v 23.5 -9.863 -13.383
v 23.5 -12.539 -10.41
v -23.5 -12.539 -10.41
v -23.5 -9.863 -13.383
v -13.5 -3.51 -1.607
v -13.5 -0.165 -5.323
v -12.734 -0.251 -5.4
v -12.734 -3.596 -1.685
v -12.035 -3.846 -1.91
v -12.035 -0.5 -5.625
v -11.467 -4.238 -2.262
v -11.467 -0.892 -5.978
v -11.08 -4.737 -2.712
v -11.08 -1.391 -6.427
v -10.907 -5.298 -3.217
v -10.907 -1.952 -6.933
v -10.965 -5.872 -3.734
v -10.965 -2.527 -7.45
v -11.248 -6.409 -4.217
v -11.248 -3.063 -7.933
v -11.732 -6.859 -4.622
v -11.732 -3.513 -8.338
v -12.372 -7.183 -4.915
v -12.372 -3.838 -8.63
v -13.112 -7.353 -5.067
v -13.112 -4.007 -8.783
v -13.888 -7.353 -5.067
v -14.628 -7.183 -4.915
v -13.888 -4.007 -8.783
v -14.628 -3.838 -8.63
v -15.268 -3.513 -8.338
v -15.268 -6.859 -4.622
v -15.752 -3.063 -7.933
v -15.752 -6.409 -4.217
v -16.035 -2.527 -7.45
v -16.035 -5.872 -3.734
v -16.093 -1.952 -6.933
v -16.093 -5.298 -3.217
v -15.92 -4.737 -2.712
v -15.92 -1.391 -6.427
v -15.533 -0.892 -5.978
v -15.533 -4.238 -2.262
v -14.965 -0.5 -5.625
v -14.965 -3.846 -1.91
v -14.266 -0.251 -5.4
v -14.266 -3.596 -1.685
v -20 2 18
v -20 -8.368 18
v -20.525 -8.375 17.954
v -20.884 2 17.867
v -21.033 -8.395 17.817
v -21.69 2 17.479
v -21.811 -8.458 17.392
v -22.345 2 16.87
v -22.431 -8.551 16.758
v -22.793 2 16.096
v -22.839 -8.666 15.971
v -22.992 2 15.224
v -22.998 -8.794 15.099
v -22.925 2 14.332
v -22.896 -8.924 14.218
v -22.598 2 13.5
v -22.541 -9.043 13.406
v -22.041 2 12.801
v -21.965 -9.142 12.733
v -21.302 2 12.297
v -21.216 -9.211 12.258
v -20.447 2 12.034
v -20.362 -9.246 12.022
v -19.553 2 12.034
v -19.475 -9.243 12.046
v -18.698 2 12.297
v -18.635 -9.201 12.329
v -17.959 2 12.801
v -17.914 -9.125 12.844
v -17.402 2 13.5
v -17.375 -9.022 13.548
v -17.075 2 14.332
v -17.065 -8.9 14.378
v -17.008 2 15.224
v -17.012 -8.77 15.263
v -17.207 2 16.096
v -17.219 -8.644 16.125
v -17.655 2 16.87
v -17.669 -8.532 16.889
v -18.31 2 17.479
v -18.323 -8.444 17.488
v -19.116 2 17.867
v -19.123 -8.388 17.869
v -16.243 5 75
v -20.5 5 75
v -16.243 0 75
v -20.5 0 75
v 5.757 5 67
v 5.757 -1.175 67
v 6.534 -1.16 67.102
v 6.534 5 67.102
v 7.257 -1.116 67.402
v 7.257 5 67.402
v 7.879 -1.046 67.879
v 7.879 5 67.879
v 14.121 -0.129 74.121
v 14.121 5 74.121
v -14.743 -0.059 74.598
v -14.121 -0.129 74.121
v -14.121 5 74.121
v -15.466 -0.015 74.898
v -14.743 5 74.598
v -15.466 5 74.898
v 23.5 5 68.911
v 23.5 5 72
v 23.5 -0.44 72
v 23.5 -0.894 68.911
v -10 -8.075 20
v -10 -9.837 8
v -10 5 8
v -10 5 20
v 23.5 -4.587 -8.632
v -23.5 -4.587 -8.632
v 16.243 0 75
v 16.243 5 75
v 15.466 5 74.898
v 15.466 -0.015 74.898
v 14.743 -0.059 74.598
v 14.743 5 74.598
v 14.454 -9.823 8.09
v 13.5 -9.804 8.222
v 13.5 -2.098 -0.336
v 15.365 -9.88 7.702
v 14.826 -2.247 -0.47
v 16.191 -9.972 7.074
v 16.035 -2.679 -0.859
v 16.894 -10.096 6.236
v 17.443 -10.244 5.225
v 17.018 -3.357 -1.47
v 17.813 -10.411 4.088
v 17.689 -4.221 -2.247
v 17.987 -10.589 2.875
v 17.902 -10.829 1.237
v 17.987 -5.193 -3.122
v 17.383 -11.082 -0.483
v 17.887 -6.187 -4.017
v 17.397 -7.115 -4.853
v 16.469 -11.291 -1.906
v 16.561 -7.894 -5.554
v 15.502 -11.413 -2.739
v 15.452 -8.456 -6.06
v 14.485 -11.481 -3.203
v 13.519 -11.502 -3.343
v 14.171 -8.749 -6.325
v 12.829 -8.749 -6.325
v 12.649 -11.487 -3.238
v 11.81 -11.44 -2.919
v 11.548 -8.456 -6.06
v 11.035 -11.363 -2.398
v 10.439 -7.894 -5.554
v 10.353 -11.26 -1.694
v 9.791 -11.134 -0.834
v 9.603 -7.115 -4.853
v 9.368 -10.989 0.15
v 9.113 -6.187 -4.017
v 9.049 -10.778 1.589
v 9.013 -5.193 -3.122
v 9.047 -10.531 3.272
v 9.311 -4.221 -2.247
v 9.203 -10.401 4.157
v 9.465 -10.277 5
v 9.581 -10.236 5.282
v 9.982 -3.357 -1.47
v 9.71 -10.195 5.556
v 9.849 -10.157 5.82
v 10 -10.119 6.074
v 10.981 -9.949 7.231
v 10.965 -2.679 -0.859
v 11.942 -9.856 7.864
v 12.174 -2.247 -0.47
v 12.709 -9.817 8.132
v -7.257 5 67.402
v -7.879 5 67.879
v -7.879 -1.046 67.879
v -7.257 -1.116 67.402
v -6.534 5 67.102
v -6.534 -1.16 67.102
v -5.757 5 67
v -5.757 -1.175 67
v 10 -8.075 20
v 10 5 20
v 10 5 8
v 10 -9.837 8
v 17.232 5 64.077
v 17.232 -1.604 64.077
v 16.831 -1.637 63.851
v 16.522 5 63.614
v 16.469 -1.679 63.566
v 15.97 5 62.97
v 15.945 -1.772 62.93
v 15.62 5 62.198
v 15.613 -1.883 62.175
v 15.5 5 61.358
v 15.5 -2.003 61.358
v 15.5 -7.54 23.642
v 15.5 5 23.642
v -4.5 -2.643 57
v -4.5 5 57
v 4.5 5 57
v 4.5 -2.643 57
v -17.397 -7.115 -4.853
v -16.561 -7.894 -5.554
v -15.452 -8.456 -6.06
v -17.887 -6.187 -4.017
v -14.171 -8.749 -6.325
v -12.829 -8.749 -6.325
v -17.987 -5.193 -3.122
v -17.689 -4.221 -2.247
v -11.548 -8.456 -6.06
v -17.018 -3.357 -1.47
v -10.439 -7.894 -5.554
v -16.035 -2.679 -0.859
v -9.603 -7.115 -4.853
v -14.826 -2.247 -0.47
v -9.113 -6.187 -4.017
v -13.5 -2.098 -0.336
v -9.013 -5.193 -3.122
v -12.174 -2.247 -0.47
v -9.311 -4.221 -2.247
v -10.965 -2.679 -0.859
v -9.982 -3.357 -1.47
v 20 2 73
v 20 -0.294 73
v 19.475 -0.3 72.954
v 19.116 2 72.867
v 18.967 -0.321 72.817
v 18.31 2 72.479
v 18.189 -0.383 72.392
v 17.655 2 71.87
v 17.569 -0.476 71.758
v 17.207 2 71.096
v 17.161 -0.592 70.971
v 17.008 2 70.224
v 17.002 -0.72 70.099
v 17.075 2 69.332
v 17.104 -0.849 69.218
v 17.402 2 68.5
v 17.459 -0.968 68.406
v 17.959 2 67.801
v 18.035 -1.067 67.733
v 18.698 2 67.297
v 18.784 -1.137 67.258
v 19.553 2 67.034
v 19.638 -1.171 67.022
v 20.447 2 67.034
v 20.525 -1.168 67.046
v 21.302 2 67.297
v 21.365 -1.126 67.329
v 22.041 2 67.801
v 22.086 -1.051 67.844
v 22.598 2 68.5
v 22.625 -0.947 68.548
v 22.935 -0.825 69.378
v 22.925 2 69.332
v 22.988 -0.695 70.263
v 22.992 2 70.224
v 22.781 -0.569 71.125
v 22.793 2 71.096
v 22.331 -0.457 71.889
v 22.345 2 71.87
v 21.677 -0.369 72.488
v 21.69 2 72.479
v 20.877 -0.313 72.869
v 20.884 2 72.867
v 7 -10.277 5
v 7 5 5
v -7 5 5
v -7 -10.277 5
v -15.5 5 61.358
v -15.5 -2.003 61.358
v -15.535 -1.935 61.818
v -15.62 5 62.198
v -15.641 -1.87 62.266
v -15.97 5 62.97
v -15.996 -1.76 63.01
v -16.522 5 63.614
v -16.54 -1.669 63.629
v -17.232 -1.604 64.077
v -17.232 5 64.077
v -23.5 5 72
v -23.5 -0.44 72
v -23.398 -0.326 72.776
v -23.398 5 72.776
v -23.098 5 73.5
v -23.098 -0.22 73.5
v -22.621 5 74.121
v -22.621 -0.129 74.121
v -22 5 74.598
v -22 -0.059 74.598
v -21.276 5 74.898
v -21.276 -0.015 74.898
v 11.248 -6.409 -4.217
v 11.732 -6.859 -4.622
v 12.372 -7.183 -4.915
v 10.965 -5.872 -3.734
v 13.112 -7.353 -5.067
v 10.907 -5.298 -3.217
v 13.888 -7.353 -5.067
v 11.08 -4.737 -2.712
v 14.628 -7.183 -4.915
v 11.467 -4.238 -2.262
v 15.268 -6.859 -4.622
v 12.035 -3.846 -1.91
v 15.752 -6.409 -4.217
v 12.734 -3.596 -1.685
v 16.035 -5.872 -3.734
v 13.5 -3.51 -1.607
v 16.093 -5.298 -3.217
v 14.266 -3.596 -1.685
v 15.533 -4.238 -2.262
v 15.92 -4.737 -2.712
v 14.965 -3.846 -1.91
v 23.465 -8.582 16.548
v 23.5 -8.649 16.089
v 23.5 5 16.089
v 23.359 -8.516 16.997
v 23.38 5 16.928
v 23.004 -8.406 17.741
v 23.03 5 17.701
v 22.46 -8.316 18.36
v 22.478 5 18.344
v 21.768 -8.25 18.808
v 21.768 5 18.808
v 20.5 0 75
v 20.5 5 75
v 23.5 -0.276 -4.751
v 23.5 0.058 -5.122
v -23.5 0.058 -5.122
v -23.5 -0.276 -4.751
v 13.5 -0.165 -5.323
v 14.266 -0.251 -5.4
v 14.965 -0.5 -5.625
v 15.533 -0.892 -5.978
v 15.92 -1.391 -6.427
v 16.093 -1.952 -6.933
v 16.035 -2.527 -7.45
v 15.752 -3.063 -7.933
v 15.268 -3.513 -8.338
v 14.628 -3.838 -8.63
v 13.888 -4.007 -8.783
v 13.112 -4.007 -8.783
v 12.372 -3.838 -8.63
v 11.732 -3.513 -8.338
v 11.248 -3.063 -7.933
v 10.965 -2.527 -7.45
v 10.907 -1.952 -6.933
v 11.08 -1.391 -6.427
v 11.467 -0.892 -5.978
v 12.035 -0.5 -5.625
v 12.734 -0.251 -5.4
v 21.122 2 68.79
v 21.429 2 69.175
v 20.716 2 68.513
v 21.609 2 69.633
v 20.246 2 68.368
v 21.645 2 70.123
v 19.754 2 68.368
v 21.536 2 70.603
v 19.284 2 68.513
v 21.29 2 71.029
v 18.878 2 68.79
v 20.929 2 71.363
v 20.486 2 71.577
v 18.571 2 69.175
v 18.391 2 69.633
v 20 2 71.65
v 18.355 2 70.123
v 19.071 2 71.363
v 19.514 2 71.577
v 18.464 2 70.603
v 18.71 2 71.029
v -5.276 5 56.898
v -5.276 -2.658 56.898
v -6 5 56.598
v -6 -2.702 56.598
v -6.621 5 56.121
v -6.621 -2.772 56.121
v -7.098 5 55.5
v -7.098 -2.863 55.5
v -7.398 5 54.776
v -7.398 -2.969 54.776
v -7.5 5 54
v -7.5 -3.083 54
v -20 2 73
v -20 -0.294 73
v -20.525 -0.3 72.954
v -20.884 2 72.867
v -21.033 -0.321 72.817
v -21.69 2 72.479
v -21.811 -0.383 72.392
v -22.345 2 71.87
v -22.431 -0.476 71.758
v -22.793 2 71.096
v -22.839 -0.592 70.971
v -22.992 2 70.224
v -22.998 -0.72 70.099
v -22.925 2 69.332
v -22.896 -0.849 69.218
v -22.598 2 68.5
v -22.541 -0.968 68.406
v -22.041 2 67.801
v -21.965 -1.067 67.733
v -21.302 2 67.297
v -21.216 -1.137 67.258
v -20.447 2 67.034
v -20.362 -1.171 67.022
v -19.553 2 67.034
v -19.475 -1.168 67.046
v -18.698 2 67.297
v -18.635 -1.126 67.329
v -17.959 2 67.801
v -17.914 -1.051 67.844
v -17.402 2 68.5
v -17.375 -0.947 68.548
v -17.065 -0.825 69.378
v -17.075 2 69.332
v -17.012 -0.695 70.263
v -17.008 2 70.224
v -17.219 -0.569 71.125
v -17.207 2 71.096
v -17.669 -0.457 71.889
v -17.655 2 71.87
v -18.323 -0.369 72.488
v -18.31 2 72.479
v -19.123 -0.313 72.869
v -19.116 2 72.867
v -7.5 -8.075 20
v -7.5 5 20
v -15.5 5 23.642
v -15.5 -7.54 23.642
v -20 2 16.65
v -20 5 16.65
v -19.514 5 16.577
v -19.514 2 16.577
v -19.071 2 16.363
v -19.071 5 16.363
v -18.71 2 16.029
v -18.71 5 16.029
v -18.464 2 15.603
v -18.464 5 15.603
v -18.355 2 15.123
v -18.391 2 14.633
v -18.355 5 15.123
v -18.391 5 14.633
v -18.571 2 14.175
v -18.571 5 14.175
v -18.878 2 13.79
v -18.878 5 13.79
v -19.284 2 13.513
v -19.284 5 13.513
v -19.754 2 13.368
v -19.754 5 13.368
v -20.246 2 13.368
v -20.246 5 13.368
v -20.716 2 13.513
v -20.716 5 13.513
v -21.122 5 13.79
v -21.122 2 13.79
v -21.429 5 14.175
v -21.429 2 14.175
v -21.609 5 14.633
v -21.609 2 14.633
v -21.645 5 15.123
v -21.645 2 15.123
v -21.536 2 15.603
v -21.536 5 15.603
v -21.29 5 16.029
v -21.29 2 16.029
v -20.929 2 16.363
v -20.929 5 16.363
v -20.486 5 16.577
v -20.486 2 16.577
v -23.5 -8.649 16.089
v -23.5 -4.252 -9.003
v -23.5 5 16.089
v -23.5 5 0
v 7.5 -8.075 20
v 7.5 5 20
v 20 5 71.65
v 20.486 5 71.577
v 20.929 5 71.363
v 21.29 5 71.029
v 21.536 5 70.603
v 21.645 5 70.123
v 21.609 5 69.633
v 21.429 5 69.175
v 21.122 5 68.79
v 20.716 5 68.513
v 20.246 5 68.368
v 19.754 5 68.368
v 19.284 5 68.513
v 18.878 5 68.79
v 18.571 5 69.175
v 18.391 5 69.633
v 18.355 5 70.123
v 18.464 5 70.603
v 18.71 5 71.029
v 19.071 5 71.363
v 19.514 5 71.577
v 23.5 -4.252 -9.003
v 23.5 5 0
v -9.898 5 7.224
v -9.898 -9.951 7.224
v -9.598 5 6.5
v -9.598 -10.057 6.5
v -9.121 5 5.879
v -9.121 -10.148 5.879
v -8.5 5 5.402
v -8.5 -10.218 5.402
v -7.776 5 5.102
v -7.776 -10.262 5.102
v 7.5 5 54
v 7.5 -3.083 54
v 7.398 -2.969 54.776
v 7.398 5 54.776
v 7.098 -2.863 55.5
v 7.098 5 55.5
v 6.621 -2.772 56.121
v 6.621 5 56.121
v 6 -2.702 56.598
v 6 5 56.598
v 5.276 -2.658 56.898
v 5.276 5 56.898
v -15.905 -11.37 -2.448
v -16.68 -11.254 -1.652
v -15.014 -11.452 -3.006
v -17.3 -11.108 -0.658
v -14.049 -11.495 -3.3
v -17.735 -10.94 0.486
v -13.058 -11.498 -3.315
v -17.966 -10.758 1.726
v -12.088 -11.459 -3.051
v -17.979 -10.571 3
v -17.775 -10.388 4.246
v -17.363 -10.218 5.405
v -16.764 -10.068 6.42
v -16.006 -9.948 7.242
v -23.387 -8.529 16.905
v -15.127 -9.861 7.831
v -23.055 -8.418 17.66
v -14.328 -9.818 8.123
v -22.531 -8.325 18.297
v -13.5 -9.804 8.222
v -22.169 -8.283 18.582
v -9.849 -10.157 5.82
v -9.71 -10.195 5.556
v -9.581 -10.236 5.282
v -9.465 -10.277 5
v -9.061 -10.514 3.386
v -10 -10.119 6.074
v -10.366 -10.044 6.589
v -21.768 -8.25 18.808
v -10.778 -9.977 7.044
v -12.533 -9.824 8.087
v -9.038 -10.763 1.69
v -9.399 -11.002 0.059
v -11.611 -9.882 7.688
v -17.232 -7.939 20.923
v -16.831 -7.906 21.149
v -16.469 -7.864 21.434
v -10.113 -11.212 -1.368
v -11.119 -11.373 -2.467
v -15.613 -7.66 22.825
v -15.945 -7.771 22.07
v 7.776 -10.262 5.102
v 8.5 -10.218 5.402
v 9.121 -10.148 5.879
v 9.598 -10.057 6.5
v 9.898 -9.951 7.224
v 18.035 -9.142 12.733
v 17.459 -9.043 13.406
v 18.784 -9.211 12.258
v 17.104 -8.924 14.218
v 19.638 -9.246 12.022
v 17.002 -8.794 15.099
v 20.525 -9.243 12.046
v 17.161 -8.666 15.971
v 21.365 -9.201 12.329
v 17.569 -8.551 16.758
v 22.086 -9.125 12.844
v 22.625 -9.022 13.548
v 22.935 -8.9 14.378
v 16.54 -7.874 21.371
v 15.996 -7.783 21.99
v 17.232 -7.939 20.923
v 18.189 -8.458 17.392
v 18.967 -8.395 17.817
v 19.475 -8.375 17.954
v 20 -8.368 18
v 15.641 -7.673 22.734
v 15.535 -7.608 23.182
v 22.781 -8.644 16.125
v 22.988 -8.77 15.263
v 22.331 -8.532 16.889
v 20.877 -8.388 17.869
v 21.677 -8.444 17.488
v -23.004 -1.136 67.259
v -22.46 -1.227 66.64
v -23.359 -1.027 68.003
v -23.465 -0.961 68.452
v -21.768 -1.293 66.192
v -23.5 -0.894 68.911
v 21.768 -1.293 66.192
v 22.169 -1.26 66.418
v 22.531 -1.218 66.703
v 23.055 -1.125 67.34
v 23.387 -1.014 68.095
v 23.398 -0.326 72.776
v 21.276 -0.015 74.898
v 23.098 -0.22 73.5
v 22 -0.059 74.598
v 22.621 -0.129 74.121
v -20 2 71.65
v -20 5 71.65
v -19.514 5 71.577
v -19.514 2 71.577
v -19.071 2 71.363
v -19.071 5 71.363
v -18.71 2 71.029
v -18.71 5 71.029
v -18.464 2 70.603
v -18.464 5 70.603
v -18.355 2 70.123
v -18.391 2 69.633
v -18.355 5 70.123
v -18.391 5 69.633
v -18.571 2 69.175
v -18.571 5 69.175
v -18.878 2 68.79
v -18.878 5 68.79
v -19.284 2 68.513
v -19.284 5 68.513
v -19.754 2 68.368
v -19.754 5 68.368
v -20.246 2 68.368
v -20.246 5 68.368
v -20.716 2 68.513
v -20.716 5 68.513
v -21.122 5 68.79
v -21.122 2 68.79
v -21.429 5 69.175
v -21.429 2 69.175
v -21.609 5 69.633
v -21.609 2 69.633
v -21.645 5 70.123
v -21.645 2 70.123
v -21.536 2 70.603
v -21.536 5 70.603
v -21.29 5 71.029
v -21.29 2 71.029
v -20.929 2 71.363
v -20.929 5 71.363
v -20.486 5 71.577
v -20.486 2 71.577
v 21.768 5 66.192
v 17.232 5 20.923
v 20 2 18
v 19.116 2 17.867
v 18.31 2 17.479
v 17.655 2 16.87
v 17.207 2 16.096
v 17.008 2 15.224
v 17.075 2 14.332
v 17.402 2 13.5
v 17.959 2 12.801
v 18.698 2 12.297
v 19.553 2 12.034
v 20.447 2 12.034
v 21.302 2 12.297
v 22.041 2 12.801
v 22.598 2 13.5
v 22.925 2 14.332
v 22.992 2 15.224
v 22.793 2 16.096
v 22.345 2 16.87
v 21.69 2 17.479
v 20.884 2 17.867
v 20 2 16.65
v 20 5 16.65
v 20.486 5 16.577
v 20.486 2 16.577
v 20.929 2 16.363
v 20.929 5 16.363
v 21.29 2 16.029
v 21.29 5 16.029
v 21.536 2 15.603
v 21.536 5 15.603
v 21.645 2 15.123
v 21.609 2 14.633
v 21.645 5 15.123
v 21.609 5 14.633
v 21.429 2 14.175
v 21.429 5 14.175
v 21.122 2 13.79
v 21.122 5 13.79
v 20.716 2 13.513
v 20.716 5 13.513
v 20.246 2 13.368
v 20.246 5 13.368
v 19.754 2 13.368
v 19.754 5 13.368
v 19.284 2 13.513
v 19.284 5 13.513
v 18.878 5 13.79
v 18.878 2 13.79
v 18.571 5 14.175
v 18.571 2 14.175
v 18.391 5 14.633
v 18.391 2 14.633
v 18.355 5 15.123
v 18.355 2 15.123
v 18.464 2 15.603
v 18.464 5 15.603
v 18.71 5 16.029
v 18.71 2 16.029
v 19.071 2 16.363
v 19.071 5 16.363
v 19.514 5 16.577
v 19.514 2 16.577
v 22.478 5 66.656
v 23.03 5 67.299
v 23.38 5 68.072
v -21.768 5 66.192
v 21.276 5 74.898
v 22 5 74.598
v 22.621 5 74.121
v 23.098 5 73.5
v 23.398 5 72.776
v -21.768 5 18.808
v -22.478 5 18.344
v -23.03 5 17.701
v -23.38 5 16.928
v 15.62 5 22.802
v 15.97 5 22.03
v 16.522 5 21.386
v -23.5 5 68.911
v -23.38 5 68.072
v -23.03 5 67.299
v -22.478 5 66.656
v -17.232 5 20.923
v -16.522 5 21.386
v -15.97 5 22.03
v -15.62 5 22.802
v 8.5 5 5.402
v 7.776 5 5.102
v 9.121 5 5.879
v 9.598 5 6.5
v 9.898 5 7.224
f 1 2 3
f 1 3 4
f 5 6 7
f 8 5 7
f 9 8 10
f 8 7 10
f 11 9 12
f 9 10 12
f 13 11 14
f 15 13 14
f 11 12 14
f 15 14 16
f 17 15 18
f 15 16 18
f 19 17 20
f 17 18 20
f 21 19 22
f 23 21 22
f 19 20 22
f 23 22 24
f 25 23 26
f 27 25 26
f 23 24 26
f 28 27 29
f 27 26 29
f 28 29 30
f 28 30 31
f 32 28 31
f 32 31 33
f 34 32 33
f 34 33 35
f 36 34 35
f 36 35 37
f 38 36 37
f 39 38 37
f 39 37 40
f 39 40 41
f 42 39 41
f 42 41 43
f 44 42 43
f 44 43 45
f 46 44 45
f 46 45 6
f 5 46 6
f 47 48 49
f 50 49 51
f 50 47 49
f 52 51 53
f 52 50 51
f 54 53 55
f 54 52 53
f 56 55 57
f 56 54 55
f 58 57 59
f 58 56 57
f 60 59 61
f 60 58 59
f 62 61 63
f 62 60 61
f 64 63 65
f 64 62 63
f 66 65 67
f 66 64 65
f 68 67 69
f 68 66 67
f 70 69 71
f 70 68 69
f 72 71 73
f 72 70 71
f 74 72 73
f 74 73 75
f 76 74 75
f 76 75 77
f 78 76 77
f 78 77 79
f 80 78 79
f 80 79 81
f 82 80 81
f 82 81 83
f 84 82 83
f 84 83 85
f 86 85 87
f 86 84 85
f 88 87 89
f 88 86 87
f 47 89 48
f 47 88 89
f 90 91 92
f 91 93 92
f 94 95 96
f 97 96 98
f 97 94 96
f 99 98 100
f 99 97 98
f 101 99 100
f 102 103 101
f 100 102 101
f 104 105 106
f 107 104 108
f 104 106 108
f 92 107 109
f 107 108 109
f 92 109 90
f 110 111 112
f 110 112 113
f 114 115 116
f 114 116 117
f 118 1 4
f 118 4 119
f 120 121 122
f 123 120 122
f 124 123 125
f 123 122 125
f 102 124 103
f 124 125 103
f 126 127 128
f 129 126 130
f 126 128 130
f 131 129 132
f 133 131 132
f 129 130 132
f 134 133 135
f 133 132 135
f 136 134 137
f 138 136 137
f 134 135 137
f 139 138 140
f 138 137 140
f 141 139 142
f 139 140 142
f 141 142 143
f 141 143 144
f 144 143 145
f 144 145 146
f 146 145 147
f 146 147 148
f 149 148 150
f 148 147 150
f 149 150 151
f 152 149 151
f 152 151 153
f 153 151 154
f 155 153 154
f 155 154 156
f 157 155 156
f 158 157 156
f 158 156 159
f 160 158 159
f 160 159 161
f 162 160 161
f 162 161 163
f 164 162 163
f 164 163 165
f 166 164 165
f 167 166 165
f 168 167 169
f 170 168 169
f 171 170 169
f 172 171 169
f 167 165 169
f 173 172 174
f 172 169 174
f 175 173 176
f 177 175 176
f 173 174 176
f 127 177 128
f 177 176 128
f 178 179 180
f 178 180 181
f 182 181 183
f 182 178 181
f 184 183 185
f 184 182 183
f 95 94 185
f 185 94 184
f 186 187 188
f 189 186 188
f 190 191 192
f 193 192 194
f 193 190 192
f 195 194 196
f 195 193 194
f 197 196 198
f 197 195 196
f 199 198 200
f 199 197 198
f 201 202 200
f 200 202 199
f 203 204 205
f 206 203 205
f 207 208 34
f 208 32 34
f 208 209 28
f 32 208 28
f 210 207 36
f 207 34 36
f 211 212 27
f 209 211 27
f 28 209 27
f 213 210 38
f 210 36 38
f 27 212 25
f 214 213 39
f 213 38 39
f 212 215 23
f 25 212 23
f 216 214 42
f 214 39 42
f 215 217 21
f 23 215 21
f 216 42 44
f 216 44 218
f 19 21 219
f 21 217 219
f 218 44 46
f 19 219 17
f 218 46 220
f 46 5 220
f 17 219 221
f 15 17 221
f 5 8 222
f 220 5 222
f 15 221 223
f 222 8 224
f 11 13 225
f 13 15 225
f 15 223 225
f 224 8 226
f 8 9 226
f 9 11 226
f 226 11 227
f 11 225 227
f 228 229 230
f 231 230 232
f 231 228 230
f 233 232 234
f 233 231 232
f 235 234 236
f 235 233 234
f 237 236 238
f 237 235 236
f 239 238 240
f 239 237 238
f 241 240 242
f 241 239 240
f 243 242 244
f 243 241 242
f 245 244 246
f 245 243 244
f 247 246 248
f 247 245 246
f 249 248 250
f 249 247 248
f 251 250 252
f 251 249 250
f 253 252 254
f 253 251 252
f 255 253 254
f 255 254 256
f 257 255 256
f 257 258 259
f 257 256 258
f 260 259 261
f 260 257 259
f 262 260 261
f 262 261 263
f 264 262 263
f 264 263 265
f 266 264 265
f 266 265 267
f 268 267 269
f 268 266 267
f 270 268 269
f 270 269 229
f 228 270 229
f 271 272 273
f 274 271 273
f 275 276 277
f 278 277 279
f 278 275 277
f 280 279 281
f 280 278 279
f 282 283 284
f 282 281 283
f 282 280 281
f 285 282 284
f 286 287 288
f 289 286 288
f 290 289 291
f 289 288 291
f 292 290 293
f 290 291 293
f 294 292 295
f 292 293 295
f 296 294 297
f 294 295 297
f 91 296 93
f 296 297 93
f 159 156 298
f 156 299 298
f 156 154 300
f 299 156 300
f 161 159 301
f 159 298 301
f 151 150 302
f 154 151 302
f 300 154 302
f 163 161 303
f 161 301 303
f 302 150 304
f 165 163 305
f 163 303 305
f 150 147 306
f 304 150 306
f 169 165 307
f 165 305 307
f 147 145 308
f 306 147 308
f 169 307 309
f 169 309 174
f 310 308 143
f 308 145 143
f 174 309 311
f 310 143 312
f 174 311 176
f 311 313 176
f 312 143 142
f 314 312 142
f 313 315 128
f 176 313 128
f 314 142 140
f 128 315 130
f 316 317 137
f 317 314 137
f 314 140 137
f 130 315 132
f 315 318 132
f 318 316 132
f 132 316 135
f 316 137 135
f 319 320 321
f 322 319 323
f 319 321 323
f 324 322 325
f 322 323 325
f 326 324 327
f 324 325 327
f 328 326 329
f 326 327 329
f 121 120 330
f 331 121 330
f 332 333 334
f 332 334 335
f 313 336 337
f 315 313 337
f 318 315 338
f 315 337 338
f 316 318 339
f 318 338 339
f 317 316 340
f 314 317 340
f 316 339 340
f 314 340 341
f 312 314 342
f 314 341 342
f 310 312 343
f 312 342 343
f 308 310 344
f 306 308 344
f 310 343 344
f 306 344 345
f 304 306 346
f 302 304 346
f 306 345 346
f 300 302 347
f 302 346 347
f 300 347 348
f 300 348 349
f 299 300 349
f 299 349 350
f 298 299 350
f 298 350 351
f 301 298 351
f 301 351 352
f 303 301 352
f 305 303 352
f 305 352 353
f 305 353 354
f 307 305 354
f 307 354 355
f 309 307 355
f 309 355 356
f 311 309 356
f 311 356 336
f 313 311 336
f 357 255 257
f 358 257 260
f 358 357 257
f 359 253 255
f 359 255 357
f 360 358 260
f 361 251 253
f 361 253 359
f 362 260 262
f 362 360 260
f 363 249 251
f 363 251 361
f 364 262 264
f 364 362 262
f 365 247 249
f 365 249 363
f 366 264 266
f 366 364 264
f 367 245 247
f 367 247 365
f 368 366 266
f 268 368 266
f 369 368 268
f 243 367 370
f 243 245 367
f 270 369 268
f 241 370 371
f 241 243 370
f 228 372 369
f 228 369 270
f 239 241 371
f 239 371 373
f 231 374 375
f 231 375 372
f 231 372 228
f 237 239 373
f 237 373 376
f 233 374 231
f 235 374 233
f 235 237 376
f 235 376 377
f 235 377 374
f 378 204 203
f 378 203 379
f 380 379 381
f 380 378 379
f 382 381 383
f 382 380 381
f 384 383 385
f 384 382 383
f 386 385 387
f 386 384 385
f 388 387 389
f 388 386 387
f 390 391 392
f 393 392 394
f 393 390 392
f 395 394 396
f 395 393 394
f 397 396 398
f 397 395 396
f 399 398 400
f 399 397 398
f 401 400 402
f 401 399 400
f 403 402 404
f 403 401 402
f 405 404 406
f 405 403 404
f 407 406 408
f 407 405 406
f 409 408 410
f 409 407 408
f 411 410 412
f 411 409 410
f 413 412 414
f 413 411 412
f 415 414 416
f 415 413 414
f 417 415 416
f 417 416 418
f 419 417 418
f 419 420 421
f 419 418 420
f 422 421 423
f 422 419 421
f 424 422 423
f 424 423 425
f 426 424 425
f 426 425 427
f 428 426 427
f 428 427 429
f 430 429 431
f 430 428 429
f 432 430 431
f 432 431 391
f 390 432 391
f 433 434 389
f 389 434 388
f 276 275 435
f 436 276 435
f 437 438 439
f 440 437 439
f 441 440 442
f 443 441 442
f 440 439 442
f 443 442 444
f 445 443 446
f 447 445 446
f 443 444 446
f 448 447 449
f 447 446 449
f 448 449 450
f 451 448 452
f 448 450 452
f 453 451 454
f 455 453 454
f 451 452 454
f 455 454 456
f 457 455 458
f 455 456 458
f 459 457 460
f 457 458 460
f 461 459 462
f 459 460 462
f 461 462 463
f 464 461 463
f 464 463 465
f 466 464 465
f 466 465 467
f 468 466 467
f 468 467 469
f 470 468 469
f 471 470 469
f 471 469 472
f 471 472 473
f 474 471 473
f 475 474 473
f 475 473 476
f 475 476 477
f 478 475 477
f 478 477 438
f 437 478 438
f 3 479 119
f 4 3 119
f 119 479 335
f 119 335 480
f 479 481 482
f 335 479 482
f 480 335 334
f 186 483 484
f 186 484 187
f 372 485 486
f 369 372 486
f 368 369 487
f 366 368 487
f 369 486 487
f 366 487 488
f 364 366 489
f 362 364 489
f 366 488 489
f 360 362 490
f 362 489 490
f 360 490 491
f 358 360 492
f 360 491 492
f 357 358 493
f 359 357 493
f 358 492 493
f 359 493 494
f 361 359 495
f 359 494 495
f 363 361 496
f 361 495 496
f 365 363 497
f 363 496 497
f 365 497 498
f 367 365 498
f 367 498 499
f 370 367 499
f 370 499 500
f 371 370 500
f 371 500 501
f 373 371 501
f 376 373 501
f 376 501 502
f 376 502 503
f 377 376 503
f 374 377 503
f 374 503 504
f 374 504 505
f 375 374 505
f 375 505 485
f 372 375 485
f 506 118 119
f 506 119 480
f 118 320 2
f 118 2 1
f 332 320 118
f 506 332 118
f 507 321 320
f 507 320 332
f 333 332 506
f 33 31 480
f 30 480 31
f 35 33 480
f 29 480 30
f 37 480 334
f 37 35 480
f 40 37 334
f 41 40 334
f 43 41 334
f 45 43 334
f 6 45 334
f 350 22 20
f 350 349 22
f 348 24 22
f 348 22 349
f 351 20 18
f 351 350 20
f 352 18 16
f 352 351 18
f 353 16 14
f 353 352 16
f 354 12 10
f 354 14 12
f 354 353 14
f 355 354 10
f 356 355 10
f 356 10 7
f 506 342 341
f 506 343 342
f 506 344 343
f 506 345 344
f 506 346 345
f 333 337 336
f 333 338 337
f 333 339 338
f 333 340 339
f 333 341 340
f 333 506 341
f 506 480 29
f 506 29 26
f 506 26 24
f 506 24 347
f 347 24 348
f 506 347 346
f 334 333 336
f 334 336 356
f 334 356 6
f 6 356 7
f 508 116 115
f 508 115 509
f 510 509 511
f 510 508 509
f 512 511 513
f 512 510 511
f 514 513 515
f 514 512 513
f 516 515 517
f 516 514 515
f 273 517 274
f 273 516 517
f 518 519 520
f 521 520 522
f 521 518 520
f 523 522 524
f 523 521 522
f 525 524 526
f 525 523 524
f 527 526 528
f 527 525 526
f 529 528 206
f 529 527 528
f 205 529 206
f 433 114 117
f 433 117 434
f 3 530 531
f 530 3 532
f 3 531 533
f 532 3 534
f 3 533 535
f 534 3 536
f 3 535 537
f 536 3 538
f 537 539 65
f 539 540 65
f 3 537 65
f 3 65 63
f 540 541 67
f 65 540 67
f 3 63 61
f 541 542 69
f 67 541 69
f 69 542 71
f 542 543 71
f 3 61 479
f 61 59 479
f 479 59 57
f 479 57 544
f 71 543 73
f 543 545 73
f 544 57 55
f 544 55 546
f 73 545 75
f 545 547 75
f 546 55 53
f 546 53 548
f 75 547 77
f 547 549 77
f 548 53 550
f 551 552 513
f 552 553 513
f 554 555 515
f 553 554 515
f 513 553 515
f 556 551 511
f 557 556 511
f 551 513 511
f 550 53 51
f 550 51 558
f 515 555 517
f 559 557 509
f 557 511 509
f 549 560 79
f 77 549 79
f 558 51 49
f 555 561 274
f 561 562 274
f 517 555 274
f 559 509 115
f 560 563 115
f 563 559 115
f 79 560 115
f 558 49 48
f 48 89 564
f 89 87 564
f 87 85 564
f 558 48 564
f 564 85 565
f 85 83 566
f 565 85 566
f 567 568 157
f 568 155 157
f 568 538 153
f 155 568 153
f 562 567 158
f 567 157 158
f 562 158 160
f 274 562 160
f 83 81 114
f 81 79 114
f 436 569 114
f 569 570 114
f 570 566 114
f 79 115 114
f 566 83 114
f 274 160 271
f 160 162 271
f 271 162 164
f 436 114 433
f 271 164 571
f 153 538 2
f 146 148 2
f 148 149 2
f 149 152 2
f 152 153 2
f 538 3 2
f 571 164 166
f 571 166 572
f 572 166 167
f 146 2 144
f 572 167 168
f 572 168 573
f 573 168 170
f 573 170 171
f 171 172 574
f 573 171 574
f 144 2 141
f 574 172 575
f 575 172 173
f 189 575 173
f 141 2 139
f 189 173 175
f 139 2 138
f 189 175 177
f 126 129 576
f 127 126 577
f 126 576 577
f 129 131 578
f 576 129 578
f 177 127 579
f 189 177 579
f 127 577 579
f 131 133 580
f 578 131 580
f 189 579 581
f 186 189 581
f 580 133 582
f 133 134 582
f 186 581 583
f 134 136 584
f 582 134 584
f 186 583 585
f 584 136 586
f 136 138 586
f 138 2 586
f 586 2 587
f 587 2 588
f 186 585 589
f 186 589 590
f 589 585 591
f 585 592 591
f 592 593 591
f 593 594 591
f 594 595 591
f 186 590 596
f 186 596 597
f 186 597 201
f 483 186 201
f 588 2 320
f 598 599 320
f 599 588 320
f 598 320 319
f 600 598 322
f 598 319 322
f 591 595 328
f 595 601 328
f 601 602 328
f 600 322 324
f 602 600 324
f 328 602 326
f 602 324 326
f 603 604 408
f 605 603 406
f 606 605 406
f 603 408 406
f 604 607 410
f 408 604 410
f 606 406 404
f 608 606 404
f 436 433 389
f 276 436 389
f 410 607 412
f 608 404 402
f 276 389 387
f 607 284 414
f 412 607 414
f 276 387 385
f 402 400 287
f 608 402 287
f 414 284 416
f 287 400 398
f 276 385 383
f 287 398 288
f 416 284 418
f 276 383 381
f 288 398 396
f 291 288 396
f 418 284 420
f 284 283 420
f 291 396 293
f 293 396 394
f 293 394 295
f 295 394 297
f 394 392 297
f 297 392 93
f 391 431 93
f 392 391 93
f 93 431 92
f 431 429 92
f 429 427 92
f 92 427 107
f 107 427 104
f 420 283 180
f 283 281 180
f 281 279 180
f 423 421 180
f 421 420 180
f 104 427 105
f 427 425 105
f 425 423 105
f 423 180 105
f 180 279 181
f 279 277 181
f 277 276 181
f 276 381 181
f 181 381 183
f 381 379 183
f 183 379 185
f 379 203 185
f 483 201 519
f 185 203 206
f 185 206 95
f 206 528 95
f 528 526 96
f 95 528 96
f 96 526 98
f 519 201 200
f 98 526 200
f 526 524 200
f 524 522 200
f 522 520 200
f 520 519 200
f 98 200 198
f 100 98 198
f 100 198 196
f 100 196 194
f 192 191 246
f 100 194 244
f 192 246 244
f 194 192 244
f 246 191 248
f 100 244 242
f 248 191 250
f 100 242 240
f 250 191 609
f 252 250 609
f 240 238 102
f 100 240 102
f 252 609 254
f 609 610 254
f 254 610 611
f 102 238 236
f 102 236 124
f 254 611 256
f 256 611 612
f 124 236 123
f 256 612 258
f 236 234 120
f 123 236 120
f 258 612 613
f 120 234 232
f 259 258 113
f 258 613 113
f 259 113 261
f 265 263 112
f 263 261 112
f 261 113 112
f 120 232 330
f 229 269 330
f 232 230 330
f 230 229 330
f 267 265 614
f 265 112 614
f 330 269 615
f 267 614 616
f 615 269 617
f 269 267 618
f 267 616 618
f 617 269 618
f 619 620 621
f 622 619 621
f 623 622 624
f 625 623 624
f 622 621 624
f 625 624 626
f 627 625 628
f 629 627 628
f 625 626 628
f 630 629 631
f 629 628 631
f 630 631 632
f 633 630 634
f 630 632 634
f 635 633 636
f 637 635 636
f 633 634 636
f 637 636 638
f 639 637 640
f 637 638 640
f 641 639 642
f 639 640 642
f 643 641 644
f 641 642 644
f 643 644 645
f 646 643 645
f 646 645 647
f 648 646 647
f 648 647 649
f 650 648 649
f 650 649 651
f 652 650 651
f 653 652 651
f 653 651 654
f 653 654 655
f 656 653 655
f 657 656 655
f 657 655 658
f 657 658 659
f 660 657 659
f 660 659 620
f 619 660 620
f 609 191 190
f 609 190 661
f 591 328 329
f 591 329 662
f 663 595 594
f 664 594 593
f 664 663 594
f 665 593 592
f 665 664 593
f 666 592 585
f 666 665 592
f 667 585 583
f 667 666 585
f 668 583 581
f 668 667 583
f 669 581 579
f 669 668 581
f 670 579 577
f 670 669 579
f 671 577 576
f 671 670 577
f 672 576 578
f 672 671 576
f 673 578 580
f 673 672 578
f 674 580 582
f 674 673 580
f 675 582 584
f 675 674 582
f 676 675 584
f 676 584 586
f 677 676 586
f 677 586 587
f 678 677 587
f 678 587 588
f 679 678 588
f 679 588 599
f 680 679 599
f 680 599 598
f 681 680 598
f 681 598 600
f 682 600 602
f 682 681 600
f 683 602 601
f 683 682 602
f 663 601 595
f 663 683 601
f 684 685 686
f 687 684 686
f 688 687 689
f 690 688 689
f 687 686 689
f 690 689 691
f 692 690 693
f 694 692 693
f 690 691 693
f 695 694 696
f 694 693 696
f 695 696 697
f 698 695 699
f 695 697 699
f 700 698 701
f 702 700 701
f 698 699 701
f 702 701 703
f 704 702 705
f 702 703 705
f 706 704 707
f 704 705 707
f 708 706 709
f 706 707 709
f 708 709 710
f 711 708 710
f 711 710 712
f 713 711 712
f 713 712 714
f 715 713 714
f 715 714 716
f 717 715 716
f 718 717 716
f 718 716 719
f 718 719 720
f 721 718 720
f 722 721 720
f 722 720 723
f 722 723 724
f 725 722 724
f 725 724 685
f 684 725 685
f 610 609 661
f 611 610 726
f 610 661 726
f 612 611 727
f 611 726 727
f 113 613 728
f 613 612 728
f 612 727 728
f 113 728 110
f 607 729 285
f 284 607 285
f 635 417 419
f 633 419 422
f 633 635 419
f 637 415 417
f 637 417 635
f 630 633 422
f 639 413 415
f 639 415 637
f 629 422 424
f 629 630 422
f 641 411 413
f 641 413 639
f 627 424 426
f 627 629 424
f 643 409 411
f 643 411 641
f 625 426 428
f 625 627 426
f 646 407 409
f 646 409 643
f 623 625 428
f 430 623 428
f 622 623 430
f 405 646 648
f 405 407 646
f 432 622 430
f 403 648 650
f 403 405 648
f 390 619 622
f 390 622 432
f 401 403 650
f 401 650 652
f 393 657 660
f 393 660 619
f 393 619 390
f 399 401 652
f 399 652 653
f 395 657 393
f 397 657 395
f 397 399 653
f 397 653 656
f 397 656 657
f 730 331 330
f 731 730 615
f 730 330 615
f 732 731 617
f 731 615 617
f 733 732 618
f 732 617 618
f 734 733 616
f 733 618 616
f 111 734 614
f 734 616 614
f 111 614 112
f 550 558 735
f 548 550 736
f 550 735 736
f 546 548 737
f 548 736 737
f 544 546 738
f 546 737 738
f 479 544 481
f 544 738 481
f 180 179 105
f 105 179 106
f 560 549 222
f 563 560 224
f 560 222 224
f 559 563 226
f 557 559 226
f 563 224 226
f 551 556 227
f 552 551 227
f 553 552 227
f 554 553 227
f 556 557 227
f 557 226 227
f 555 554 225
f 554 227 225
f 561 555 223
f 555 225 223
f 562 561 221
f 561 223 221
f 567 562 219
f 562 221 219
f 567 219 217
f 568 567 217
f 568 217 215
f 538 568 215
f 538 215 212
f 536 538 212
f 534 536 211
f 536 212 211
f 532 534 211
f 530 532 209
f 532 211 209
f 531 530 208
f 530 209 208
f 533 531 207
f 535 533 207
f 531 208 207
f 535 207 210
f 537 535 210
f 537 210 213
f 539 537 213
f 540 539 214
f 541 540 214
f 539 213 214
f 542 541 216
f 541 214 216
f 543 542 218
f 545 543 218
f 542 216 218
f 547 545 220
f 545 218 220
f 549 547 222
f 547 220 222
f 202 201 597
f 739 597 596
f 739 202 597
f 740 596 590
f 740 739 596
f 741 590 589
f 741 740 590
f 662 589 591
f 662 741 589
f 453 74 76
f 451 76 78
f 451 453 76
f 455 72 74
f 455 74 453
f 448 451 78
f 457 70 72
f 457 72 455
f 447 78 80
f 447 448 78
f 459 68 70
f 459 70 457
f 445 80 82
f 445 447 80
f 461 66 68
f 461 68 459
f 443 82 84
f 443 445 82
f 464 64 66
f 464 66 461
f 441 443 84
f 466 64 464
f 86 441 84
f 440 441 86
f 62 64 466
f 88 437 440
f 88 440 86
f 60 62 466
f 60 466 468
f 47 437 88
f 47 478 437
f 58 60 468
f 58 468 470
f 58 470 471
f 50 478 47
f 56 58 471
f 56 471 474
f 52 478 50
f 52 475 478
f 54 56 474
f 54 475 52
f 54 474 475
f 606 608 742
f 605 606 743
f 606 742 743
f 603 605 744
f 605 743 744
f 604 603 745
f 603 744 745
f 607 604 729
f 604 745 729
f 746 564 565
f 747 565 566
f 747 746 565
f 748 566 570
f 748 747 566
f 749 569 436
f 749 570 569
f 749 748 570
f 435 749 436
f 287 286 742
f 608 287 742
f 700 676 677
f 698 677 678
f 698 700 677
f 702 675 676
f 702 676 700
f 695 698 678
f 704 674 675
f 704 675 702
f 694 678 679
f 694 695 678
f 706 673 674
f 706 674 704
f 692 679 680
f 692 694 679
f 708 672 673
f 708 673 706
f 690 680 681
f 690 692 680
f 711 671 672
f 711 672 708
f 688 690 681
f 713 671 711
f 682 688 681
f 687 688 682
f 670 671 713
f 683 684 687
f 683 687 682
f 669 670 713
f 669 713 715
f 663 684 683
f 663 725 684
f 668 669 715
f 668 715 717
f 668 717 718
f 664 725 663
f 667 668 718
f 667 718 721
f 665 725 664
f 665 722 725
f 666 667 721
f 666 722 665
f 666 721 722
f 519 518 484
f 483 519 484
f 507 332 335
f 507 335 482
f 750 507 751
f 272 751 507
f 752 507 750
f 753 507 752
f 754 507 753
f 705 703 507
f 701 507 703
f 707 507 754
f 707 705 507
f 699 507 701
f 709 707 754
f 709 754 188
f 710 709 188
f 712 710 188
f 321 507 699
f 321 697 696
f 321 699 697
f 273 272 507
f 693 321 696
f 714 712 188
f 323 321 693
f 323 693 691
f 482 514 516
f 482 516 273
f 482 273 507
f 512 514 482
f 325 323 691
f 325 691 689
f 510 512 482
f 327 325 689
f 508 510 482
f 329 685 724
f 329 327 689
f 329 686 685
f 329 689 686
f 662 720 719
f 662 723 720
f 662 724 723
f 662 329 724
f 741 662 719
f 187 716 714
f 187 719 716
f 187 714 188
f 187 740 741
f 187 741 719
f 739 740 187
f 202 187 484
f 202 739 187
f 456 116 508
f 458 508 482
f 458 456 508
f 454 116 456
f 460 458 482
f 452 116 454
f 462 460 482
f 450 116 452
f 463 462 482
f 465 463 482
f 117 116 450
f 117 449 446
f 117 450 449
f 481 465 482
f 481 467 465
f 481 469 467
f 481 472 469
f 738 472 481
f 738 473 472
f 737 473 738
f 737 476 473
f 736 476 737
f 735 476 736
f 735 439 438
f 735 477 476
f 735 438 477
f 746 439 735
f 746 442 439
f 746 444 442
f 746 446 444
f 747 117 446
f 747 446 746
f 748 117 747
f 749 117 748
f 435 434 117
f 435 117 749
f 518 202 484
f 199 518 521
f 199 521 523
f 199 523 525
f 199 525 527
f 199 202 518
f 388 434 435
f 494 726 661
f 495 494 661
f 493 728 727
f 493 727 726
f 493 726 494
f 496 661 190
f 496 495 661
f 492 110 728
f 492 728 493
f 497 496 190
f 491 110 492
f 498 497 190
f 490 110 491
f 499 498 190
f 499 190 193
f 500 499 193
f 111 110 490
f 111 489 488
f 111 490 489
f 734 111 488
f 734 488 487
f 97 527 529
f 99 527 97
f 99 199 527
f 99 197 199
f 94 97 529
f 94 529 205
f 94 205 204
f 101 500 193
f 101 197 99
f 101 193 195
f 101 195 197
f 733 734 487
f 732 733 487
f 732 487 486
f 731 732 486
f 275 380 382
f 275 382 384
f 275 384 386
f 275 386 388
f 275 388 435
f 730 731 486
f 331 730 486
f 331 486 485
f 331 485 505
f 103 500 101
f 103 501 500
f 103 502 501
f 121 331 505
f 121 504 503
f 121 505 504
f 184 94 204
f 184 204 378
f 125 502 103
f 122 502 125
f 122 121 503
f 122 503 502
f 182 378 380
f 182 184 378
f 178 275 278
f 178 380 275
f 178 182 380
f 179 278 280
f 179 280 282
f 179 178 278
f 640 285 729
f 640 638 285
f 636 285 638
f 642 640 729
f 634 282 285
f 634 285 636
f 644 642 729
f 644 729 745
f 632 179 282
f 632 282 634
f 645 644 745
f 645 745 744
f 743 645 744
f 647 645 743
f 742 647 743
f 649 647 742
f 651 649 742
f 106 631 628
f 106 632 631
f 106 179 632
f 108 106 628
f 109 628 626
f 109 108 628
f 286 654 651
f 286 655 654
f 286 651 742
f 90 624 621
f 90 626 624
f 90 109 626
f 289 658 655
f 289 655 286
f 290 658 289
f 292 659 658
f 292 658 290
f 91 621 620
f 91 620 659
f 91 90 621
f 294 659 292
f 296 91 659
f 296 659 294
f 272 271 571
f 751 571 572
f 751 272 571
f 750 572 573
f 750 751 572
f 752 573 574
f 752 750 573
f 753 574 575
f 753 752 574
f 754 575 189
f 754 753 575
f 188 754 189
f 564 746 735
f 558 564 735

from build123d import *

# Parameters (mm, degrees)
EXTRUDE_2_DEPTH     = 5
SKETCH_3_R          = 1.65
CUT_EXTRUDE_1_DEPTH = 79.754364958
EXTRUDE_3_DEPTH     = 23.5
SKETCH_6_R          = 2.6
CUT_EXTRUDE_3_DEPTH = 83.719354566
CUT_EXTRUDE_4_REACH = 89.719
CUT_EXTRUDE_START   = -5
SKETCH_7_R          = 4.5
CUT_EXTRUDE_5_REACH = 85.529
CUT_EXTRUDE_START_2 = 3
SKETCH_8_R          = 3
CUT_EXTRUDE_2_DEPTH = 81.528760183
FILLET_1_R          = 3


with BuildPart() as part:
    # 草图2 → 凸台-拉伸2 (new body)
    with BuildSketch(Plane(origin=(0, 0, 0), x_dir=(1, 0, 0), z_dir=(0, 1, 0))):
        Polygon((0, 0), (23.5, 0), (23.5, -14), (23.5, -75), (0, -75), align=None)
    extrude_2 = extrude(amount=EXTRUDE_2_DEPTH)

    # 镜向1: 凸台-拉伸2 across plane
    add(extrude_2.mirror(Plane(origin=(0, 5, 75), x_dir=(0, 0, 1), z_dir=(1, 0, 0))))

    # 草图3 → 切除-拉伸1 (cut, through all)
    with BuildSketch(Plane(origin=(0, 5, 0), x_dir=(1, 0, 0), z_dir=(0, 1, 0))):
        with Locations(Location((-20, -15, 0), (0, 0, 270))):
            Circle(SKETCH_3_R)
        with Locations(Location((20, -15, 0), (0, 0, 270))):
            Circle(SKETCH_3_R)
        with Locations(Location((-20, -70, 0), (0, 0, 270))):
            Circle(SKETCH_3_R)
        with Locations(Location((20, -70, 0), (0, 0, 270))):
            Circle(SKETCH_3_R)
    extrude(amount=-CUT_EXTRUDE_1_DEPTH, mode=Mode.SUBTRACT)

    # 草图5 → 凸台-拉伸3 (add, symmetric)
    with BuildSketch(Plane(origin=(0, 0, 0), x_dir=(0, 0, -1), z_dir=(1, 0, 0))):
        Polygon((-75, 0), (10.410032825, -12.539418935), (13.382612127, -9.86289651), (0, 5), (0, 0), align=None)
        Polygon((4.750827305, -0.276328261), (8.631784822, -4.586568249), (9.003357235, -4.252002945), (5.122399718, 0.058237042), align=None)
    extrude(amount=EXTRUDE_3_DEPTH, both=True)

    # 草图6 → 切除-拉伸3 (cut, through all)
    with BuildSketch(Plane(origin=(0, 2.573244145, -2.857877151), x_dir=(1, 0, 0), z_dir=(0, 0.6691306063588544, -0.7431448254773979))):
        with Locations(Location((-13.5, 6.284275873, 0), (0, 0, 270))):
            Circle(SKETCH_6_R)
        with Locations(Location((13.5, 6.284275873, 0), (0, 0, 270))):
            Circle(SKETCH_6_R)
    extrude(amount=-CUT_EXTRUDE_3_DEPTH, mode=Mode.SUBTRACT)

    # 切除-拉伸4: up to this plane
    cut_extrude_4_end = Plane(origin=(23.5, -10.778746663, 1.582474746), z_dir=(0, 0.9893939239349117, -0.145257231423012))
    # 草图7 → 切除-拉伸4 (cut, up to the surface)
    with BuildSketch(Plane(origin=(0, 2.573244145, -2.857877151), x_dir=(1, 0, 0), z_dir=(0, 0.6691306063588544, -0.7431448254773979)).offset(CUT_EXTRUDE_START), mode=Mode.PRIVATE) as cut_extrude_4_sk1:
        with Locations(Location((-13.5, 6.284275873, 0), (0, 0, 270))):
            Circle(SKETCH_7_R)
    cut_extrude_4_tool1 = split(extrude(cut_extrude_4_sk1.sketch, amount=-CUT_EXTRUDE_4_REACH, mode=Mode.PRIVATE), bisect_by=cut_extrude_4_end, keep=Keep.BOTH, mode=Mode.PRIVATE)
    add(cut_extrude_4_tool1.solids().sort_by_distance((-13.5, -5.442536, -3.347154))[0], mode=Mode.SUBTRACT)
    # 草图7 → 切除-拉伸4 (cut, up to the surface)
    with BuildSketch(Plane(origin=(0, 2.573244145, -2.857877151), x_dir=(1, 0, 0), z_dir=(0, 0.6691306063588544, -0.7431448254773979)).offset(CUT_EXTRUDE_START), mode=Mode.PRIVATE) as cut_extrude_4_sk2:
        with Locations(Location((13.5, 6.284275873, 0), (0, 0, 270))):
            Circle(SKETCH_7_R)
    cut_extrude_4_tool2 = split(extrude(cut_extrude_4_sk2.sketch, amount=-CUT_EXTRUDE_4_REACH, mode=Mode.PRIVATE), bisect_by=cut_extrude_4_end, keep=Keep.BOTH, mode=Mode.PRIVATE)
    add(cut_extrude_4_tool2.solids().sort_by_distance((13.5, -5.442536, -3.347154))[0], mode=Mode.SUBTRACT)

    # 切除-拉伸5: up to this plane
    cut_extrude_5_end = Plane(origin=(23.5, -10.778746663, 1.582474746), z_dir=(0, 0.9893939239349117, -0.145257231423012))
    # 草图8 → 切除-拉伸5 (cut, up to the surface)
    with BuildSketch(Plane.XZ.offset(-5).offset(CUT_EXTRUDE_START_2), mode=Mode.PRIVATE) as cut_extrude_5_sk1:
        with Locations(Location((-20, 15, 0), (0, 0, 90))):
            Circle(SKETCH_8_R)
    cut_extrude_5_tool1 = split(extrude(cut_extrude_5_sk1.sketch, amount=CUT_EXTRUDE_5_REACH, mode=Mode.PRIVATE), bisect_by=cut_extrude_5_end, keep=Keep.BOTH, mode=Mode.PRIVATE)
    add(cut_extrude_5_tool1.solids().sort_by_distance((-20, 2, 15))[0], mode=Mode.SUBTRACT)
    # 草图8 → 切除-拉伸5 (cut, up to the surface)
    with BuildSketch(Plane.XZ.offset(-5).offset(CUT_EXTRUDE_START_2), mode=Mode.PRIVATE) as cut_extrude_5_sk2:
        with Locations(Location((20, 15, 0), (0, 0, 90))):
            Circle(SKETCH_8_R)
    cut_extrude_5_tool2 = split(extrude(cut_extrude_5_sk2.sketch, amount=CUT_EXTRUDE_5_REACH, mode=Mode.PRIVATE), bisect_by=cut_extrude_5_end, keep=Keep.BOTH, mode=Mode.PRIVATE)
    add(cut_extrude_5_tool2.solids().sort_by_distance((20, 2, 15))[0], mode=Mode.SUBTRACT)
    # 草图8 → 切除-拉伸5 (cut, up to the surface)
    with BuildSketch(Plane.XZ.offset(-5).offset(CUT_EXTRUDE_START_2), mode=Mode.PRIVATE) as cut_extrude_5_sk3:
        with Locations(Location((20, 70, 0), (0, 0, 90))):
            Circle(SKETCH_8_R)
    cut_extrude_5_tool3 = split(extrude(cut_extrude_5_sk3.sketch, amount=CUT_EXTRUDE_5_REACH, mode=Mode.PRIVATE), bisect_by=cut_extrude_5_end, keep=Keep.BOTH, mode=Mode.PRIVATE)
    add(cut_extrude_5_tool3.solids().sort_by_distance((20, 2, 70))[0], mode=Mode.SUBTRACT)
    # 草图8 → 切除-拉伸5 (cut, up to the surface)
    with BuildSketch(Plane.XZ.offset(-5).offset(CUT_EXTRUDE_START_2), mode=Mode.PRIVATE) as cut_extrude_5_sk4:
        with Locations(Location((-20, 70, 0), (0, 0, 90))):
            Circle(SKETCH_8_R)
    cut_extrude_5_tool4 = split(extrude(cut_extrude_5_sk4.sketch, amount=CUT_EXTRUDE_5_REACH, mode=Mode.PRIVATE), bisect_by=cut_extrude_5_end, keep=Keep.BOTH, mode=Mode.PRIVATE)
    add(cut_extrude_5_tool4.solids().sort_by_distance((-20, 2, 70))[0], mode=Mode.SUBTRACT)

    # 草图4 → 切除-拉伸2 (cut, through all)
    with BuildSketch(Plane(origin=(0, 5, 0), x_dir=(1, 0, 0), z_dir=(0, 1, 0))):
        Polygon((-10, -5), (-10, -20), (-7.5, -20), (-7.5, -57), (7.5, -57), (7.5, -20), (10, -20), (10, -5), align=None)
        Polygon((-7, -67), (-15, -75), (15, -75), (7, -67), align=None)
        Polygon((-23.5, -18), (-23.5, -67), (-15.5, -63.269538735), (-15.5, -21.730461265), align=None)
        Polygon((23.5, -18), (15.5, -21.730461265), (15.5, -63.269538735), (23.5, -67), align=None)
    extrude(amount=-CUT_EXTRUDE_2_DEPTH, mode=Mode.SUBTRACT)

    # 圆角1
    # the kernel refuses this fillet: 3 mm, written as the material it adds along each edge
    with BuildSketch(Plane(origin=(-15.5, 5, 21.730461265), x_dir=(-0.9063077870366472, 0, -0.42261826174070566), z_dir=(0, -1, 0))) as fillet_1_piece_1_section:
        with BuildLine():
            CenterArc((FILLET_1_R * 0.637070260807, -FILLET_1_R), FILLET_1_R, 90, 65)
            Line((-FILLET_1_R * 0.269237526229, -FILLET_1_R * 0.577381738259), (0, 0))
            Line((0, 0), (FILLET_1_R * 0.637070260807, 0))
        make_face()
    fillet_1_piece_1 = extrude(amount=17.598759961, mode=Mode.PRIVATE)
    fillet_1_piece_1 = split(fillet_1_piece_1, bisect_by=Plane(origin=(-15.879555916, -7.651082655, 22.886004601), z_dir=(0, 0.9893939239349115, -0.14525723142301197)), keep=Keep.TOP, mode=Mode.PRIVATE)
    add(fillet_1_piece_1)
    with BuildSketch(Plane(origin=(-15.5, 5, 63.269538735), x_dir=(0, 0, -1), z_dir=(0, -1, 0))) as fillet_1_piece_2_section:
        with BuildLine():
            CenterArc((FILLET_1_R * 0.637070260807, -FILLET_1_R), FILLET_1_R, 90, 65)
            Line((-FILLET_1_R * 0.269237526229, -FILLET_1_R * 0.577381738259), (0, 0))
            Line((0, 0), (FILLET_1_R * 0.637070260807, 0))
        make_face()
    fillet_1_piece_2 = extrude(amount=11.500227068, mode=Mode.PRIVATE)
    fillet_1_piece_2 = split(fillet_1_piece_2, bisect_by=Plane(origin=(-15.87363951, -1.687245158, 63.507628217), z_dir=(0, 0.9893939239349115, -0.14525723142301197)), keep=Keep.TOP, mode=Mode.PRIVATE)
    add(fillet_1_piece_2)
    with BuildSketch(Plane(origin=(7.5, 5, 57), x_dir=(0, 0, -1), z_dir=(0, -1, 0))) as fillet_1_piece_3_section:
        with BuildLine():
            CenterArc((FILLET_1_R, -FILLET_1_R), FILLET_1_R, 90, 90)
            Line((0, -FILLET_1_R), (0, 0))
            Line((0, 0), (FILLET_1_R, 0))
        make_face()
    fillet_1_piece_3 = extrude(amount=15.142658402, mode=Mode.PRIVATE)
    fillet_1_piece_3 = split(fillet_1_piece_3, bisect_by=Plane(origin=(6.825500476, -2.66184405, 56.869320354), z_dir=(0, 0.9893939239349115, -0.14525723142301197)), keep=Keep.TOP, mode=Mode.PRIVATE)
    add(fillet_1_piece_3)
    with BuildSketch(Plane(origin=(-7.5, 5, 57), x_dir=(1, 0, 0), z_dir=(0, -1, 0))) as fillet_1_piece_4_section:
        with BuildLine():
            CenterArc((FILLET_1_R, -FILLET_1_R), FILLET_1_R, 90, 90)
            Line((0, -FILLET_1_R), (0, 0))
            Line((0, 0), (FILLET_1_R, 0))
        make_face()
    fillet_1_piece_4 = extrude(amount=15.142658402, mode=Mode.PRIVATE)
    fillet_1_piece_4 = split(fillet_1_piece_4, bisect_by=Plane(origin=(-6.825500476, -2.66184405, 56.869320354), z_dir=(0, 0.9893939239349115, -0.14525723142301197)), keep=Keep.TOP, mode=Mode.PRIVATE)
    add(fillet_1_piece_4)
    with BuildSketch(Plane(origin=(-10, 5, 5), x_dir=(1, 0, 0), z_dir=(0, -1, 0))) as fillet_1_piece_5_section:
        with BuildLine():
            CenterArc((FILLET_1_R, FILLET_1_R), FILLET_1_R, 180, 90)
            Line((0, FILLET_1_R), (0, 0))
            Line((0, 0), (FILLET_1_R, 0))
        make_face()
    fillet_1_piece_5 = extrude(amount=21.652323405, mode=Mode.PRIVATE)
    fillet_1_piece_5 = split(fillet_1_piece_5, bisect_by=Plane(origin=(-9.315353327, -10.016611336, 6.773624645), z_dir=(0, 0.9893939239349115, -0.14525723142301197)), keep=Keep.TOP, mode=Mode.PRIVATE)
    fillet_1_piece_5 = fillet_1_piece_5 - Plane(origin=(-13.5, -8.634898015, 0.198322875), x_dir=(0, 0.7431448254773979, 0.6691306063588544), z_dir=(0, 0.6691306063588544, -0.7431448254773979)) * Cylinder(4.5, 56, mode=Mode.PRIVATE)
    add(fillet_1_piece_5)
    with BuildSketch(Plane(origin=(10, 5, 5), x_dir=(-1, 0, 0), z_dir=(0, -1, 0))) as fillet_1_piece_6_section:
        with BuildLine():
            CenterArc((FILLET_1_R, -FILLET_1_R), FILLET_1_R, 90, 90)
            Line((0, -FILLET_1_R), (0, 0))
            Line((0, 0), (FILLET_1_R, 0))
        make_face()
    fillet_1_piece_6 = extrude(amount=21.652323405, mode=Mode.PRIVATE)
    fillet_1_piece_6 = split(fillet_1_piece_6, bisect_by=Plane(origin=(9.315353327, -10.016611336, 6.773624643), z_dir=(0, 0.9893939239349115, -0.14525723142301197)), keep=Keep.TOP, mode=Mode.PRIVATE)
    fillet_1_piece_6 = fillet_1_piece_6 - Plane(origin=(13.5, -8.634898017, 0.198322878), x_dir=(0, 0.7431448254773979, 0.6691306063588544), z_dir=(0, 0.6691306063588544, -0.7431448254773979)) * Cylinder(4.5, 56, mode=Mode.PRIVATE)
    add(fillet_1_piece_6)
    with BuildSketch(Plane(origin=(7, 5, 67), x_dir=(-1, 0, 0), z_dir=(0, -1, 0))) as fillet_1_piece_7_section:
        with BuildLine():
            CenterArc((FILLET_1_R * 0.414213562373, -FILLET_1_R), FILLET_1_R, 90, 45)
            Line((-FILLET_1_R * 0.292893218813, -FILLET_1_R * 0.292893218813), (0, 0))
            Line((0, 0), (FILLET_1_R * 0.414213562373, 0))
        make_face()
    fillet_1_piece_7 = extrude(amount=9.281116563, mode=Mode.PRIVATE)
    fillet_1_piece_7 = split(fillet_1_piece_7, bisect_by=Plane(origin=(6.92099422, -1.082611782, 67.625981449), z_dir=(0, 0.9893939239349115, -0.14525723142301197)), keep=Keep.TOP, mode=Mode.PRIVATE)
    add(fillet_1_piece_7)
    with BuildSketch(Plane(origin=(-7, 5, 67), x_dir=(-0.7071067811865526, 0, 0.7071067811865426), z_dir=(0, -1, 0))) as fillet_1_piece_8_section:
        with BuildLine():
            CenterArc((FILLET_1_R * 0.414213562373, -FILLET_1_R), FILLET_1_R, 90, 45)
            Line((-FILLET_1_R * 0.292893218813, -FILLET_1_R * 0.292893218813), (0, 0))
            Line((0, 0), (FILLET_1_R * 0.414213562373, 0))
        make_face()
    fillet_1_piece_8 = extrude(amount=9.281116563, mode=Mode.PRIVATE)
    fillet_1_piece_8 = split(fillet_1_piece_8, bisect_by=Plane(origin=(-6.92099422, -1.082611782, 67.625981449), z_dir=(0, 0.9893939239349115, -0.14525723142301197)), keep=Keep.TOP, mode=Mode.PRIVATE)
    add(fillet_1_piece_8)
    with BuildSketch(Plane(origin=(15.5, 5, 63.269538735), x_dir=(0.9063077870366488, 0, 0.4226182617407019), z_dir=(0, -1, 0))) as fillet_1_piece_9_section:
        with BuildLine():
            CenterArc((FILLET_1_R * 0.637070260807, -FILLET_1_R), FILLET_1_R, 90, 65)
            Line((-FILLET_1_R * 0.269237526229, -FILLET_1_R * 0.577381738259), (0, 0))
            Line((0, 0), (FILLET_1_R * 0.637070260807, 0))
        make_face()
    fillet_1_piece_9 = extrude(amount=11.500227068, mode=Mode.PRIVATE)
    fillet_1_piece_9 = split(fillet_1_piece_9, bisect_by=Plane(origin=(15.87363951, -1.687245158, 63.507628217), z_dir=(0, 0.9893939239349115, -0.14525723142301197)), keep=Keep.TOP, mode=Mode.PRIVATE)
    add(fillet_1_piece_9)
    with BuildSketch(Plane(origin=(15.5, 5, 21.730461265), x_dir=(0.9063077870366475, 0, -0.4226182617407048), z_dir=(0, -1, 0))) as fillet_1_piece_10_section:
        with BuildLine():
            CenterArc((FILLET_1_R * 0.637070260807, FILLET_1_R), FILLET_1_R, 205, 65)
            Line((-FILLET_1_R * 0.269237526229, FILLET_1_R * 0.577381738259), (0, 0))
            Line((0, 0), (FILLET_1_R * 0.637070260807, 0))
        make_face()
    fillet_1_piece_10 = extrude(amount=17.598759961, mode=Mode.PRIVATE)
    fillet_1_piece_10 = split(fillet_1_piece_10, bisect_by=Plane(origin=(15.879555916, -7.651082655, 22.886004601), z_dir=(0, 0.9893939239349115, -0.14525723142301197)), keep=Keep.TOP, mode=Mode.PRIVATE)
    add(fillet_1_piece_10)
    # the kernel refuses this fillet: 3 mm, written as the material it takes off along each edge
    with BuildSketch(Plane(origin=(-23.5, 9.778026956, 67), x_dir=(0.9063077870366487, 0, -0.4226182617407022), z_dir=(0, -1, 0)), Plane(origin=(23.5, 9.778026956, 67), x_dir=(0, 0, 1), z_dir=(0, -1, 0))) as fillet_1_2_piece_1:
        with BuildLine():
            CenterArc((FILLET_1_R * 0.637070260807, FILLET_1_R), FILLET_1_R, 205, 65)
            Line((-FILLET_1_R * 0.269237526229, FILLET_1_R * 0.577381738259), (0, 0))
            Line((0, 0), (FILLET_1_R * 0.637070260807, 0))
        make_face()
    extrude(amount=15.730568757, mode=Mode.SUBTRACT)
    with BuildSketch(Plane(origin=(-23.5, 9.778026956, 18), x_dir=(0, 0, -1), z_dir=(0, -1, 0))) as fillet_1_2_piece_2:
        with BuildLine():
            CenterArc((FILLET_1_R * 0.637070260807, FILLET_1_R), FILLET_1_R, 205, 65)
            Line((-FILLET_1_R * 0.269237526229, FILLET_1_R * 0.577381738259), (0, 0))
            Line((0, 0), (FILLET_1_R * 0.637070260807, 0))
        make_face()
    extrude(amount=22.924472184, mode=Mode.SUBTRACT)
    with BuildSketch(Plane(origin=(15, 8.106601718, 75), x_dir=(-0.7071067811865526, 0, -0.7071067811865426), z_dir=(0, -1, 0)), Plane(origin=(-15, 8.106601718, 75), x_dir=(-1, 0, 0), z_dir=(0, -1, 0))) as fillet_1_2_piece_3:
        with BuildLine():
            CenterArc((FILLET_1_R * 0.414213562373, FILLET_1_R), FILLET_1_R, 225, 45)
            Line((-FILLET_1_R * 0.292893218813, FILLET_1_R * 0.292893218813), (0, 0))
            Line((0, 0), (FILLET_1_R * 0.414213562373, 0))
        make_face()
    extrude(amount=11.213203436, mode=Mode.SUBTRACT)
    with BuildSketch(Plane(origin=(-23.5, -7.5, 75), x_dir=(1, 0, 0), z_dir=(0, 1, 0))) as fillet_1_2_piece_4:
        with BuildLine():
            CenterArc((FILLET_1_R, FILLET_1_R), FILLET_1_R, 180, 90)
            Line((0, FILLET_1_R), (0, 0))
            Line((0, 0), (FILLET_1_R, 0))
        make_face()
    extrude(amount=20, mode=Mode.SUBTRACT)
    with BuildSketch(Plane(origin=(23.5, 9.778026956, 18), x_dir=(0, 0, -1), z_dir=(0, -1, 0))) as fillet_1_2_piece_5:
        with BuildLine():
            CenterArc((FILLET_1_R * 0.637070260807, -FILLET_1_R), FILLET_1_R, 90, 65)
            Line((-FILLET_1_R * 0.269237526229, -FILLET_1_R * 0.577381738259), (0, 0))
            Line((0, 0), (FILLET_1_R * 0.637070260807, 0))
        make_face()
    extrude(amount=22.924472184, mode=Mode.SUBTRACT)
    with BuildSketch(Plane(origin=(23.5, -7.5, 75), x_dir=(-1, 0, 0), z_dir=(0, 1, 0))) as fillet_1_2_piece_6:
        with BuildLine():
            CenterArc((FILLET_1_R, -FILLET_1_R), FILLET_1_R, 90, 90)
            Line((0, -FILLET_1_R), (0, 0))
            Line((0, 0), (FILLET_1_R, 0))
        make_face()
    extrude(amount=20, mode=Mode.SUBTRACT)


solid = part.part
